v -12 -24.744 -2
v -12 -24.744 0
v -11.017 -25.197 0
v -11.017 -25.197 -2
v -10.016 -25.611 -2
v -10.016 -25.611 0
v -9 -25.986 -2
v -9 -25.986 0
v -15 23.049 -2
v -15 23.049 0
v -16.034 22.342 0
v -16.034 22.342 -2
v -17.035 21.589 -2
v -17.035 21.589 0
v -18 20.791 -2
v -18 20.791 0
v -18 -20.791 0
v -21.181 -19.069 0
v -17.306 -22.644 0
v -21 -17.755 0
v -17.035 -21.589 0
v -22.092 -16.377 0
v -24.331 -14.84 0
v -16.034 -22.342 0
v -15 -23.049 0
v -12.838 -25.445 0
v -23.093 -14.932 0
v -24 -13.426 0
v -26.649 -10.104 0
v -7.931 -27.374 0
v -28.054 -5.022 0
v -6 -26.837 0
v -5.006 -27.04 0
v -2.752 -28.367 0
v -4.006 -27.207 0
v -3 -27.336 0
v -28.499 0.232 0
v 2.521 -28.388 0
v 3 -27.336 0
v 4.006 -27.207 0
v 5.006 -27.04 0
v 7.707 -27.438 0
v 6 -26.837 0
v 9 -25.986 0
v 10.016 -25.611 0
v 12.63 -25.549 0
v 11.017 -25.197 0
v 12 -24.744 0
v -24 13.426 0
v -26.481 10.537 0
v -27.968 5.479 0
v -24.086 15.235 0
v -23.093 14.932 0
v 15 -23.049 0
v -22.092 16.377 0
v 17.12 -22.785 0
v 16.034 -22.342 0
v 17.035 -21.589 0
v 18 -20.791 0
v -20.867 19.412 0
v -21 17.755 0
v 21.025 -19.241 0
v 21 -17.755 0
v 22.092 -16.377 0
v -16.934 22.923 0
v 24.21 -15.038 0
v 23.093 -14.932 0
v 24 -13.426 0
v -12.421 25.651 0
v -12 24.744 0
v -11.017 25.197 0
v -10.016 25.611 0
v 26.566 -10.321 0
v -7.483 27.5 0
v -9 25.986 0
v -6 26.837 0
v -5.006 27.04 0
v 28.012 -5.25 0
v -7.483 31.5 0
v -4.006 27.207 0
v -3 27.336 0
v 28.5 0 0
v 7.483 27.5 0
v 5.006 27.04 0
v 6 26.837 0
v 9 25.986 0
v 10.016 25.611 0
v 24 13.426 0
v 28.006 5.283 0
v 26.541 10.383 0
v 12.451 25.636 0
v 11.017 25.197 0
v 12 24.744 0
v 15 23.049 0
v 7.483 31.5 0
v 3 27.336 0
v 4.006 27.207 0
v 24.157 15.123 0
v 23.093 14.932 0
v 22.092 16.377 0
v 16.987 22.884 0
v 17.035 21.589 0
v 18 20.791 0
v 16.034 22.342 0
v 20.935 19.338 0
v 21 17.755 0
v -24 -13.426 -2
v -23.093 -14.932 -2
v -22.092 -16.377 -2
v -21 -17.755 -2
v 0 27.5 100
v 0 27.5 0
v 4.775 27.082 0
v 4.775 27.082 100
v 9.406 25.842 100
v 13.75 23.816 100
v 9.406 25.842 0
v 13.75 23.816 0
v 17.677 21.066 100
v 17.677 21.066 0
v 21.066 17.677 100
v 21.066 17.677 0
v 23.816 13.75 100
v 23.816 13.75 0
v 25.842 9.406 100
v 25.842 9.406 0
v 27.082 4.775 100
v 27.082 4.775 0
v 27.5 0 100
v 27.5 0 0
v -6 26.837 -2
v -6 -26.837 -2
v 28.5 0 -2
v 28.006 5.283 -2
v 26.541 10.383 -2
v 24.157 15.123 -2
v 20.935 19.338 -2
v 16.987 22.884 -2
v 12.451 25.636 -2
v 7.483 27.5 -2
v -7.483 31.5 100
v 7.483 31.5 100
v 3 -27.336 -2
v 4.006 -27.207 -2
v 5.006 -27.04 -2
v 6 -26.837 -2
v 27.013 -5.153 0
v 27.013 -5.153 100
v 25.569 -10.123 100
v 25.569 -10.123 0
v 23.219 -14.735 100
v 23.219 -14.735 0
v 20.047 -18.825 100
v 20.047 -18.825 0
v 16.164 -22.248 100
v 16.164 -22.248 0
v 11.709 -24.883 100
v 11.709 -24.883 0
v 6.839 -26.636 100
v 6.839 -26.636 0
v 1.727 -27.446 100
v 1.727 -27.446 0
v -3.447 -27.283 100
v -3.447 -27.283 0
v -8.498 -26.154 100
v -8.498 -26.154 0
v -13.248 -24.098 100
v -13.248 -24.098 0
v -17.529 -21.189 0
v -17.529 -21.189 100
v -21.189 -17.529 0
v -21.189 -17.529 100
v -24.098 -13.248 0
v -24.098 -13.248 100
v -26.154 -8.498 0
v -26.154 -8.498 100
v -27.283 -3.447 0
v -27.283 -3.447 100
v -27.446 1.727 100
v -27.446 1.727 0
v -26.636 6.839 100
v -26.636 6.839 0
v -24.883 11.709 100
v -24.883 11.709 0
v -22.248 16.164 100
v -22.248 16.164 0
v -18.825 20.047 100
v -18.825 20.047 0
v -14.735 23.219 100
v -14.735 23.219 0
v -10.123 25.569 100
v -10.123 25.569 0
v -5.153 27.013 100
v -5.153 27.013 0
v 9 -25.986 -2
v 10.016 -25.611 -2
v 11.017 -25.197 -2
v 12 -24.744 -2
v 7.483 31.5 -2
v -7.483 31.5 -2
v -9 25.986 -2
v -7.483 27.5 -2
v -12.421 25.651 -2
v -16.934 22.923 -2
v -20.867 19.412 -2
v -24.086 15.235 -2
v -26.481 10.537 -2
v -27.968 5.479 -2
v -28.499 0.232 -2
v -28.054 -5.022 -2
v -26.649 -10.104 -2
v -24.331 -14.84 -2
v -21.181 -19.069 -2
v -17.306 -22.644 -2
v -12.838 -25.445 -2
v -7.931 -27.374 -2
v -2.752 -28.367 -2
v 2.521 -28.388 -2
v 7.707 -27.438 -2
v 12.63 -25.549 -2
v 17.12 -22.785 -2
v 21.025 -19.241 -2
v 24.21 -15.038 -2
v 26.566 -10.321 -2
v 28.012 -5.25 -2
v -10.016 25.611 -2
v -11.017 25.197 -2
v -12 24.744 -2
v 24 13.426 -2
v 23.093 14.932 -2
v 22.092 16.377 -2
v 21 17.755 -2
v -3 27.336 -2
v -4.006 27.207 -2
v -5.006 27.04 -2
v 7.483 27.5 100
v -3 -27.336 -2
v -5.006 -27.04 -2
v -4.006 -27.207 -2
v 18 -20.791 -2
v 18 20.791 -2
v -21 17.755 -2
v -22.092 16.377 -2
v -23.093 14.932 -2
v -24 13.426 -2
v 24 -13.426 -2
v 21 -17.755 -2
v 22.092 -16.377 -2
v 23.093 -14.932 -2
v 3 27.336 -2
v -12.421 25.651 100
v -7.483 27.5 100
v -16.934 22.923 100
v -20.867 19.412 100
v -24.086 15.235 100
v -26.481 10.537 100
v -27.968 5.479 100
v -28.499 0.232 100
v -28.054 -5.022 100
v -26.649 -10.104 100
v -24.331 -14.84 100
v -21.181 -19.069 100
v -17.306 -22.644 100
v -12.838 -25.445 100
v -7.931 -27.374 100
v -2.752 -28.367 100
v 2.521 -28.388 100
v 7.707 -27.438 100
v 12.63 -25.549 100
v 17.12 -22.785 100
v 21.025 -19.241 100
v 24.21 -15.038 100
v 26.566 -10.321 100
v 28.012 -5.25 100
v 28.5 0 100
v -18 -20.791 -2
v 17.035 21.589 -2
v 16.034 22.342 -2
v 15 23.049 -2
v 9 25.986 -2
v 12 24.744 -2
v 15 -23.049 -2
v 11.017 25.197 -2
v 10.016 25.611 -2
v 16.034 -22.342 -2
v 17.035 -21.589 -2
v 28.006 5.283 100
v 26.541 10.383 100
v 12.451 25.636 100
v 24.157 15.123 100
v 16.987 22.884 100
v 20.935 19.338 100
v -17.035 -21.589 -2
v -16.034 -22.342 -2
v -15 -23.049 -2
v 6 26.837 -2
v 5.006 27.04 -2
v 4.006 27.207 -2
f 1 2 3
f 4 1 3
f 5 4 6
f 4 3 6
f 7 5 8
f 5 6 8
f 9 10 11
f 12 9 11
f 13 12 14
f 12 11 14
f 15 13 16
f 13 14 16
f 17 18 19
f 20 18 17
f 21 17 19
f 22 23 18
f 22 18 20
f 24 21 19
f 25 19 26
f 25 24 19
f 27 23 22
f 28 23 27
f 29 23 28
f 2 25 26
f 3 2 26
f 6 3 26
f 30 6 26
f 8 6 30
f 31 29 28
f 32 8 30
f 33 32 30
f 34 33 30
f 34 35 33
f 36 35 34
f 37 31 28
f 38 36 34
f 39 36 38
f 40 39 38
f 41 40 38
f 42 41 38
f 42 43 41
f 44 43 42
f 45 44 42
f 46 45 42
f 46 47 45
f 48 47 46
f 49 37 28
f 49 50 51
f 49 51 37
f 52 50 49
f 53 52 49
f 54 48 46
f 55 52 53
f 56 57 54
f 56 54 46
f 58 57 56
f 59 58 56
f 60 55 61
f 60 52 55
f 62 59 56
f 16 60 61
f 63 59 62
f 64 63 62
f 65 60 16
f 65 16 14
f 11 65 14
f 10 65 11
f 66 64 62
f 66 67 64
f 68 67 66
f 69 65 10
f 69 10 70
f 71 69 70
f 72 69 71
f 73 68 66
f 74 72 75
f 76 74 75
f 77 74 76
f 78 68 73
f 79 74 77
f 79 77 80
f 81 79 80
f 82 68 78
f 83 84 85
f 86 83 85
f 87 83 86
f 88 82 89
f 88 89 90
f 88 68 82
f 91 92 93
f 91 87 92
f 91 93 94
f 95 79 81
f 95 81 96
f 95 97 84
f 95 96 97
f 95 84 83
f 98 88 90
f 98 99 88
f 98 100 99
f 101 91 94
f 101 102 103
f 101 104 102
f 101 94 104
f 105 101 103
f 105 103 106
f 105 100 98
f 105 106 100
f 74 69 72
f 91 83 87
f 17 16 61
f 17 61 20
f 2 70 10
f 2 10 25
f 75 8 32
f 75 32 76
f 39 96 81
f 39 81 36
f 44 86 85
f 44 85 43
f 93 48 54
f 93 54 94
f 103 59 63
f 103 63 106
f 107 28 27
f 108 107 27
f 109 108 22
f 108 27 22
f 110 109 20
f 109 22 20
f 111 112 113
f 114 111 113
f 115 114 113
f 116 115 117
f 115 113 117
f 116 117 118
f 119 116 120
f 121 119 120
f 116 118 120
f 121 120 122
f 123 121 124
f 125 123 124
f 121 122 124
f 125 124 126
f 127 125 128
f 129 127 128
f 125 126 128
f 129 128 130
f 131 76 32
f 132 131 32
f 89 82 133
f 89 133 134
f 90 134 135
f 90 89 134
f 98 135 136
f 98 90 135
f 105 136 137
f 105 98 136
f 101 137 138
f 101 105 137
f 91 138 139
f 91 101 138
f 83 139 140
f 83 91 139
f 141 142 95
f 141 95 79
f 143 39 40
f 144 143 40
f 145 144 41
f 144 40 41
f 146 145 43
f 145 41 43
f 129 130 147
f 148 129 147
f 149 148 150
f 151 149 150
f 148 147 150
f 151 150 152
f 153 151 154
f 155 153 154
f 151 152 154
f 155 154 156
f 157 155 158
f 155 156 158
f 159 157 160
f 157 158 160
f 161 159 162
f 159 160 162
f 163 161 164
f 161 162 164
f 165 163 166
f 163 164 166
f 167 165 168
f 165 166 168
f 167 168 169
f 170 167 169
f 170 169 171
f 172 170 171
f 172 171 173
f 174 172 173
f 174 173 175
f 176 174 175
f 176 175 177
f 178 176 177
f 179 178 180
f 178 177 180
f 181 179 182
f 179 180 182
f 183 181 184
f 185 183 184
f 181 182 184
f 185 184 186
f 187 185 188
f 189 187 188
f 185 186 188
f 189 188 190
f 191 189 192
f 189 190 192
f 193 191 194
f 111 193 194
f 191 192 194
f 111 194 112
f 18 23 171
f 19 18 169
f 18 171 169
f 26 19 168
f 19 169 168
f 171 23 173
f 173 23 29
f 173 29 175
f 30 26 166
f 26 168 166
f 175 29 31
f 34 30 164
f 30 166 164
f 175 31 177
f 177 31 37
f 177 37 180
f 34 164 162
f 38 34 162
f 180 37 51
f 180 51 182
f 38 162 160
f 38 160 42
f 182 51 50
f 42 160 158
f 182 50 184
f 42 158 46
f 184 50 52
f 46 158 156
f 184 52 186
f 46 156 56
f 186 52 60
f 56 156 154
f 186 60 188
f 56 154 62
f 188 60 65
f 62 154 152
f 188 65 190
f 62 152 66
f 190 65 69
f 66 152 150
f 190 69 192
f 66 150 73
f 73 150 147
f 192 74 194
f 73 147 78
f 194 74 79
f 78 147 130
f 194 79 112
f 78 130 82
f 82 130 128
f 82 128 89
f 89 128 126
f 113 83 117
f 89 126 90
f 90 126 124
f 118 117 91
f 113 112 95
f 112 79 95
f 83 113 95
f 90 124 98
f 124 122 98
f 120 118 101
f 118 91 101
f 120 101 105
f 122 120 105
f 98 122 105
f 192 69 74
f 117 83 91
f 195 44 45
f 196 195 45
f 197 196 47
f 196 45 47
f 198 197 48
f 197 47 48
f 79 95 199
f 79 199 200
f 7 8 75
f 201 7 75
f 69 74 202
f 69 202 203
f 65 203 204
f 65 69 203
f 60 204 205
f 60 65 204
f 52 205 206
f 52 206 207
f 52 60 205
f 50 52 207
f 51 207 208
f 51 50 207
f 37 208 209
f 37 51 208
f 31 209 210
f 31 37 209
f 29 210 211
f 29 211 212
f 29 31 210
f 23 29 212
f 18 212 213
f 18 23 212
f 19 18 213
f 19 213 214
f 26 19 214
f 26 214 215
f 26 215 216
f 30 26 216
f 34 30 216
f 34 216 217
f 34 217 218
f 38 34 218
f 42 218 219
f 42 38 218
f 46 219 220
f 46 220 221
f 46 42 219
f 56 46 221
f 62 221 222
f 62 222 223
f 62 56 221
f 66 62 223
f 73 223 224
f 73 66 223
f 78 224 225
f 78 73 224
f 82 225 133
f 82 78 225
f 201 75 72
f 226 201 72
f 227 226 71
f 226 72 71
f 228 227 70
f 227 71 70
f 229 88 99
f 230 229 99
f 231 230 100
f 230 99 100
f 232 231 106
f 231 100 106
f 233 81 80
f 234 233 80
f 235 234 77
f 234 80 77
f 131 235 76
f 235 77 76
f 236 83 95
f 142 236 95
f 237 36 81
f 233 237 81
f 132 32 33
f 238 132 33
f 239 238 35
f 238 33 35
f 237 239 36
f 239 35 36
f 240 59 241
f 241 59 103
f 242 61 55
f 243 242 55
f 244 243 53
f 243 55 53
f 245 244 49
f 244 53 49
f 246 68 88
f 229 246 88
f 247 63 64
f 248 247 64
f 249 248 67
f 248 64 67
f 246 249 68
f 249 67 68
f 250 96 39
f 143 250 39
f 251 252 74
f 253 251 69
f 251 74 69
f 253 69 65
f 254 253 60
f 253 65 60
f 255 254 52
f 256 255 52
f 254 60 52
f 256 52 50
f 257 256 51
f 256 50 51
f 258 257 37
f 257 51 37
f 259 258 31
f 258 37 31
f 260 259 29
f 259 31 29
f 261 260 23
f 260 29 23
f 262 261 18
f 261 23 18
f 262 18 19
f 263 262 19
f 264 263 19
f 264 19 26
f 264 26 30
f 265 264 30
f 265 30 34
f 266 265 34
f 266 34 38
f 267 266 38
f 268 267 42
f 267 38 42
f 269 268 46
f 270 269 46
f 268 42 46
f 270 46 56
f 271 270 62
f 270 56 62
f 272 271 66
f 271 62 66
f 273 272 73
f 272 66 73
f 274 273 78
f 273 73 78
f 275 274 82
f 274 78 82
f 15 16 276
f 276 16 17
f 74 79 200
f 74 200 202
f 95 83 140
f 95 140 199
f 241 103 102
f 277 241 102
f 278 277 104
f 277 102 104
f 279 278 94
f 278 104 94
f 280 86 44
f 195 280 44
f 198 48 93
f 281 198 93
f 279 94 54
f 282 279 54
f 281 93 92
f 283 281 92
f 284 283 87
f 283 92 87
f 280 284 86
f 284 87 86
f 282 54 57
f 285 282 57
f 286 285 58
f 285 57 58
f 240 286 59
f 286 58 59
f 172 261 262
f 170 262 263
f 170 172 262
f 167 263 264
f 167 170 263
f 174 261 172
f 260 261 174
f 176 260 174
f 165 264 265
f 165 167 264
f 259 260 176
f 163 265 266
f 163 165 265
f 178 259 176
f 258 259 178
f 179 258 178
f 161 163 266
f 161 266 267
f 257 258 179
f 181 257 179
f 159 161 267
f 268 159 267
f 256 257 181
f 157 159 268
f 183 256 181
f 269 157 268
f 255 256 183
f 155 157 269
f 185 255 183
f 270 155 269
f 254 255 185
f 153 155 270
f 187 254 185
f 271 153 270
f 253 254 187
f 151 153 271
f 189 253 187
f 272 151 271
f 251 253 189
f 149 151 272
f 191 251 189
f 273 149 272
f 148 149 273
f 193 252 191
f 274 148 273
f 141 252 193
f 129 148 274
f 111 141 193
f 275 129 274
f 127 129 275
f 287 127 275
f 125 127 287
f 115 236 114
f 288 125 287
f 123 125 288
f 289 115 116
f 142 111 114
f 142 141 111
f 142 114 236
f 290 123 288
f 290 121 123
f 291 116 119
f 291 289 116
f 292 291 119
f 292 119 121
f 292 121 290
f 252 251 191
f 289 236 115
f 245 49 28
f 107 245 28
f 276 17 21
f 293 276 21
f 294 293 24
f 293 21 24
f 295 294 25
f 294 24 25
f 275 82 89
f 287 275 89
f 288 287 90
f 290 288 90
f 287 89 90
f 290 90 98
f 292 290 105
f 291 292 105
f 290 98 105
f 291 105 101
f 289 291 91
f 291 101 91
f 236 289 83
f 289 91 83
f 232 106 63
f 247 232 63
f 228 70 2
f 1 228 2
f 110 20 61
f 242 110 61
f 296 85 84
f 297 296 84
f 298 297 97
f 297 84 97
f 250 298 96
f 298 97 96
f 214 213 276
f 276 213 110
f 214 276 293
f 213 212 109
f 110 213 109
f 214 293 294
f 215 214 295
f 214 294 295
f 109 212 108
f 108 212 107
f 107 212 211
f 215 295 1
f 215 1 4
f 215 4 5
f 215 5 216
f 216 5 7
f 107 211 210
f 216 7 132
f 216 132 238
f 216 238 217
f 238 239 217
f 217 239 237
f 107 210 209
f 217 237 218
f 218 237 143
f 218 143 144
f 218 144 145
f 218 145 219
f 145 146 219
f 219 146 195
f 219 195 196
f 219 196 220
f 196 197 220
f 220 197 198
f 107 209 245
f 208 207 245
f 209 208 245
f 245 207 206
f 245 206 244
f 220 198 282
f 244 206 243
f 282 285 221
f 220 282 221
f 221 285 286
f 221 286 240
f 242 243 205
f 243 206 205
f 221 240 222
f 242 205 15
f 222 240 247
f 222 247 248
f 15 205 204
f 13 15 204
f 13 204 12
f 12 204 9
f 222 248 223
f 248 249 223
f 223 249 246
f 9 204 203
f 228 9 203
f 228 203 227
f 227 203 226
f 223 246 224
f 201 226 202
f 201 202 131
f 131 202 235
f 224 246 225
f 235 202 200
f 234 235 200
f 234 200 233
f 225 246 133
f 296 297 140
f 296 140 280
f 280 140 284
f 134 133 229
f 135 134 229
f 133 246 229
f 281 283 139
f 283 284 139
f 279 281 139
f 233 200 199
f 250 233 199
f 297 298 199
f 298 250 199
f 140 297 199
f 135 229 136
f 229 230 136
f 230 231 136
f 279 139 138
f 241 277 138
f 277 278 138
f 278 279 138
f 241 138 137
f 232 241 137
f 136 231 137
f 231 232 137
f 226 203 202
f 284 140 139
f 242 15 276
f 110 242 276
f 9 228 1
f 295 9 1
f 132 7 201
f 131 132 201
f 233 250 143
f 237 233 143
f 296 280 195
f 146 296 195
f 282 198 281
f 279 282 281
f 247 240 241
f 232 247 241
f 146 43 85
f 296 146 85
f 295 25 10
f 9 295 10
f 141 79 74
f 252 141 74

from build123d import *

# Parameters (mm, degrees)
F1_DEPTH = 2
F2_DEPTH = 100
F4_DEPTH = 2


with BuildPart() as f1:
    # F0 (on Top) → F1 (new body)
    with BuildSketch(Plane.XY):
        with BuildLine():
            Line((7.4833147735, 27.5), (0, 27.5))
            Line((0, 27.5), (-7.4833147735, 27.5))
            ThreePointArc((-7.4833147735, 27.5), (-17.3057147924, -22.6442539184), (28.5, 0))
            ThreePointArc((28.5, 0), (22.6442539184, 17.3057147924), (7.4833147735, 27.5))
        make_face()
        with BuildLine():
            ThreePointArc((0, 27.5), (19.4454364826, 19.4454364826), (27.5, 0))
            ThreePointArc((27.5, 0), (-19.4454364826, -19.4454364826), (0, 27.5))
        make_face(mode=Mode.SUBTRACT)
        with BuildLine():
            ThreePointArc((0, 27.5), (-19.4454364826, -19.4454364826), (27.5, 0))
            ThreePointArc((27.5, 0), (19.4454364826, 19.4454364826), (0, 27.5))
        make_face()
        with BuildLine():
            Line((-7.4833147735, 31.5), (-7.4833147735, 27.5))
            ThreePointArc((-7.4833147735, 27.5), (0, 28.5), (7.4833147735, 27.5))
            Line((7.4833147735, 27.5), (7.4833147735, 31.5))
            Line((7.4833147735, 31.5), (-7.4833147735, 31.5))
        make_face()
        with BuildLine():
            Line((-7.4833147735, 27.5), (0, 27.5))
            Line((0, 27.5), (7.4833147735, 27.5))
            ThreePointArc((7.4833147735, 27.5), (0, 28.5), (-7.4833147735, 27.5))
        make_face()
    extrude(amount=-F1_DEPTH)

    # F3 (on Top) → F4 (cut)
    with BuildSketch(Plane.XY):
        with BuildLine():
            Line((-3, 0), (-3, 27.3358738657))
            ThreePointArc((-3, 27.3358738657), (-4.5068947909, 27.1281753781), (-6, 26.8374738006))
            Line((-6, 26.8374738006), (-6, 0))
            Line((-6, 0), (-3, 0))
        make_face()
        with BuildLine():
            ThreePointArc((-6, -26.8374738006), (-4.5068947909, -27.1281753781), (-3, -27.3358738657))
            Line((-3, -27.3358738657), (-3, 0))
            Line((-3, 0), (-6, 0))
            Line((-6, 0), (-6, -26.8374738006))
        make_face()
        with BuildLine():
            ThreePointArc((-12, -24.7436860633), (-10.5183444867, -25.4089438832), (-9, -25.9855729204))
            Line((-9, -25.9855729204), (-9, 0))
            Line((-9, 0), (-12, 0))
            Line((-12, 0), (-12, -24.7436860633))
        make_face()
        with BuildLine():
            Line((-9, 0), (-9, 25.9855729204))
            ThreePointArc((-9, 25.9855729204), (-10.5183444867, 25.4089438832), (-12, 24.7436860633))
            Line((-12, 24.7436860633), (-12, 0))
            Line((-12, 0), (-9, 0))
        make_face()
        with BuildLine():
            Line((-15, 0), (-15, 23.0488611432))
            ThreePointArc((-15, 23.0488611432), (-16.5385885131, 21.9710056664), (-18, 20.7906228863))
            Line((-18, 20.7906228863), (-18, 0))
            Line((-18, 0), (-15, 0))
        make_face()
        with BuildLine():
            ThreePointArc((-18, -20.7906228863), (-16.5385885131, -21.9710056664), (-15, -23.0488611432))
            Line((-15, -23.0488611432), (-15, 0))
            Line((-15, 0), (-18, 0))
            Line((-18, 0), (-18, -20.7906228863))
        make_face()
        with BuildLine():
            ThreePointArc((-24, -13.4257215821), (-22.6038994641, -15.6624943422), (-21, -17.7552809046))
            Line((-21, -17.7552809046), (-21, 0))
            Line((-21, 0), (-24, 0))
            Line((-24, 0), (-24, -13.4257215821))
        make_face()
        with BuildLine():
            Line((-21, 0), (-21, 17.7552809046))
            ThreePointArc((-21, 17.7552809046), (-22.6038994641, 15.6624943422), (-24, 13.4257215821))
            Line((-24, 13.4257215821), (-24, 0))
            Line((-24, 0), (-21, 0))
        make_face()
        with BuildLine():
            Line((6, 0), (6, 26.8374738006))
            ThreePointArc((6, 26.8374738006), (4.5068947909, 27.1281753781), (3, 27.3358738657))
            Line((3, 27.3358738657), (3, 0))
            Line((3, 0), (6, 0))
        make_face()
        with BuildLine():
            ThreePointArc((3, -27.3358738657), (4.5068947909, -27.1281753781), (6, -26.8374738006))
            Line((6, -26.8374738006), (6, 0))
            Line((6, 0), (3, 0))
            Line((3, 0), (3, -27.3358738657))
        make_face()
        with BuildLine():
            ThreePointArc((9, -25.9855729204), (10.5183444867, -25.4089438832), (12, -24.7436860633))
            Line((12, -24.7436860633), (12, 0))
            Line((12, 0), (9, 0))
            Line((9, 0), (9, -25.9855729204))
        make_face()
        with BuildLine():
            Line((12, 0), (12, 24.7436860633))
            ThreePointArc((12, 24.7436860633), (10.5183444867, 25.4089438832), (9, 25.9855729204))
            Line((9, 25.9855729204), (9, 0))
            Line((9, 0), (12, 0))
        make_face()
        with BuildLine():
            Line((18, 0), (18, 20.7906228863))
            ThreePointArc((18, 20.7906228863), (16.5385885131, 21.9710056664), (15, 23.0488611432))
            Line((15, 23.0488611432), (15, 0))
            Line((15, 0), (18, 0))
        make_face()
        with BuildLine():
            ThreePointArc((15, -23.0488611432), (16.5385885131, -21.9710056664), (18, -20.7906228863))
            Line((18, -20.7906228863), (18, 0))
            Line((18, 0), (15, 0))
            Line((15, 0), (15, -23.0488611432))
        make_face()
        with BuildLine():
            Line((24, 0), (24, 13.4257215821))
            ThreePointArc((24, 13.4257215821), (22.6038994641, 15.6624943422), (21, 17.7552809046))
            Line((21, 17.7552809046), (21, 0))
            Line((21, 0), (24, 0))
        make_face()
        with BuildLine():
            ThreePointArc((21, -17.7552809046), (22.6038994641, -15.6624943422), (24, -13.4257215821))
            Line((24, -13.4257215821), (24, 0))
            Line((24, 0), (21, 0))
            Line((21, 0), (21, -17.7552809046))
        make_face()
    extrude(amount=-F4_DEPTH, mode=Mode.SUBTRACT)


with BuildPart() as f2:
    # F0 (on Top) → F2 (new body)
    with BuildSketch(Plane.XY):
        with BuildLine():
            Line((7.4833147735, 27.5), (0, 27.5))
            Line((0, 27.5), (-7.4833147735, 27.5))
            ThreePointArc((-7.4833147735, 27.5), (-17.3057147924, -22.6442539184), (28.5, 0))
            ThreePointArc((28.5, 0), (22.6442539184, 17.3057147924), (7.4833147735, 27.5))
        make_face()
        with BuildLine():
            ThreePointArc((0, 27.5), (19.4454364826, 19.4454364826), (27.5, 0))
            ThreePointArc((27.5, 0), (-19.4454364826, -19.4454364826), (0, 27.5))
        make_face(mode=Mode.SUBTRACT)
        with BuildLine():
            Line((-7.4833147735, 27.5), (0, 27.5))
            Line((0, 27.5), (7.4833147735, 27.5))
            ThreePointArc((7.4833147735, 27.5), (0, 28.5), (-7.4833147735, 27.5))
        make_face()
        with BuildLine():
            Line((-7.4833147735, 31.5), (-7.4833147735, 27.5))
            ThreePointArc((-7.4833147735, 27.5), (0, 28.5), (7.4833147735, 27.5))
            Line((7.4833147735, 27.5), (7.4833147735, 31.5))
            Line((7.4833147735, 31.5), (-7.4833147735, 31.5))
        make_face()
    extrude(amount=F2_DEPTH)


solid = Compound([f1.part, f2.part])
